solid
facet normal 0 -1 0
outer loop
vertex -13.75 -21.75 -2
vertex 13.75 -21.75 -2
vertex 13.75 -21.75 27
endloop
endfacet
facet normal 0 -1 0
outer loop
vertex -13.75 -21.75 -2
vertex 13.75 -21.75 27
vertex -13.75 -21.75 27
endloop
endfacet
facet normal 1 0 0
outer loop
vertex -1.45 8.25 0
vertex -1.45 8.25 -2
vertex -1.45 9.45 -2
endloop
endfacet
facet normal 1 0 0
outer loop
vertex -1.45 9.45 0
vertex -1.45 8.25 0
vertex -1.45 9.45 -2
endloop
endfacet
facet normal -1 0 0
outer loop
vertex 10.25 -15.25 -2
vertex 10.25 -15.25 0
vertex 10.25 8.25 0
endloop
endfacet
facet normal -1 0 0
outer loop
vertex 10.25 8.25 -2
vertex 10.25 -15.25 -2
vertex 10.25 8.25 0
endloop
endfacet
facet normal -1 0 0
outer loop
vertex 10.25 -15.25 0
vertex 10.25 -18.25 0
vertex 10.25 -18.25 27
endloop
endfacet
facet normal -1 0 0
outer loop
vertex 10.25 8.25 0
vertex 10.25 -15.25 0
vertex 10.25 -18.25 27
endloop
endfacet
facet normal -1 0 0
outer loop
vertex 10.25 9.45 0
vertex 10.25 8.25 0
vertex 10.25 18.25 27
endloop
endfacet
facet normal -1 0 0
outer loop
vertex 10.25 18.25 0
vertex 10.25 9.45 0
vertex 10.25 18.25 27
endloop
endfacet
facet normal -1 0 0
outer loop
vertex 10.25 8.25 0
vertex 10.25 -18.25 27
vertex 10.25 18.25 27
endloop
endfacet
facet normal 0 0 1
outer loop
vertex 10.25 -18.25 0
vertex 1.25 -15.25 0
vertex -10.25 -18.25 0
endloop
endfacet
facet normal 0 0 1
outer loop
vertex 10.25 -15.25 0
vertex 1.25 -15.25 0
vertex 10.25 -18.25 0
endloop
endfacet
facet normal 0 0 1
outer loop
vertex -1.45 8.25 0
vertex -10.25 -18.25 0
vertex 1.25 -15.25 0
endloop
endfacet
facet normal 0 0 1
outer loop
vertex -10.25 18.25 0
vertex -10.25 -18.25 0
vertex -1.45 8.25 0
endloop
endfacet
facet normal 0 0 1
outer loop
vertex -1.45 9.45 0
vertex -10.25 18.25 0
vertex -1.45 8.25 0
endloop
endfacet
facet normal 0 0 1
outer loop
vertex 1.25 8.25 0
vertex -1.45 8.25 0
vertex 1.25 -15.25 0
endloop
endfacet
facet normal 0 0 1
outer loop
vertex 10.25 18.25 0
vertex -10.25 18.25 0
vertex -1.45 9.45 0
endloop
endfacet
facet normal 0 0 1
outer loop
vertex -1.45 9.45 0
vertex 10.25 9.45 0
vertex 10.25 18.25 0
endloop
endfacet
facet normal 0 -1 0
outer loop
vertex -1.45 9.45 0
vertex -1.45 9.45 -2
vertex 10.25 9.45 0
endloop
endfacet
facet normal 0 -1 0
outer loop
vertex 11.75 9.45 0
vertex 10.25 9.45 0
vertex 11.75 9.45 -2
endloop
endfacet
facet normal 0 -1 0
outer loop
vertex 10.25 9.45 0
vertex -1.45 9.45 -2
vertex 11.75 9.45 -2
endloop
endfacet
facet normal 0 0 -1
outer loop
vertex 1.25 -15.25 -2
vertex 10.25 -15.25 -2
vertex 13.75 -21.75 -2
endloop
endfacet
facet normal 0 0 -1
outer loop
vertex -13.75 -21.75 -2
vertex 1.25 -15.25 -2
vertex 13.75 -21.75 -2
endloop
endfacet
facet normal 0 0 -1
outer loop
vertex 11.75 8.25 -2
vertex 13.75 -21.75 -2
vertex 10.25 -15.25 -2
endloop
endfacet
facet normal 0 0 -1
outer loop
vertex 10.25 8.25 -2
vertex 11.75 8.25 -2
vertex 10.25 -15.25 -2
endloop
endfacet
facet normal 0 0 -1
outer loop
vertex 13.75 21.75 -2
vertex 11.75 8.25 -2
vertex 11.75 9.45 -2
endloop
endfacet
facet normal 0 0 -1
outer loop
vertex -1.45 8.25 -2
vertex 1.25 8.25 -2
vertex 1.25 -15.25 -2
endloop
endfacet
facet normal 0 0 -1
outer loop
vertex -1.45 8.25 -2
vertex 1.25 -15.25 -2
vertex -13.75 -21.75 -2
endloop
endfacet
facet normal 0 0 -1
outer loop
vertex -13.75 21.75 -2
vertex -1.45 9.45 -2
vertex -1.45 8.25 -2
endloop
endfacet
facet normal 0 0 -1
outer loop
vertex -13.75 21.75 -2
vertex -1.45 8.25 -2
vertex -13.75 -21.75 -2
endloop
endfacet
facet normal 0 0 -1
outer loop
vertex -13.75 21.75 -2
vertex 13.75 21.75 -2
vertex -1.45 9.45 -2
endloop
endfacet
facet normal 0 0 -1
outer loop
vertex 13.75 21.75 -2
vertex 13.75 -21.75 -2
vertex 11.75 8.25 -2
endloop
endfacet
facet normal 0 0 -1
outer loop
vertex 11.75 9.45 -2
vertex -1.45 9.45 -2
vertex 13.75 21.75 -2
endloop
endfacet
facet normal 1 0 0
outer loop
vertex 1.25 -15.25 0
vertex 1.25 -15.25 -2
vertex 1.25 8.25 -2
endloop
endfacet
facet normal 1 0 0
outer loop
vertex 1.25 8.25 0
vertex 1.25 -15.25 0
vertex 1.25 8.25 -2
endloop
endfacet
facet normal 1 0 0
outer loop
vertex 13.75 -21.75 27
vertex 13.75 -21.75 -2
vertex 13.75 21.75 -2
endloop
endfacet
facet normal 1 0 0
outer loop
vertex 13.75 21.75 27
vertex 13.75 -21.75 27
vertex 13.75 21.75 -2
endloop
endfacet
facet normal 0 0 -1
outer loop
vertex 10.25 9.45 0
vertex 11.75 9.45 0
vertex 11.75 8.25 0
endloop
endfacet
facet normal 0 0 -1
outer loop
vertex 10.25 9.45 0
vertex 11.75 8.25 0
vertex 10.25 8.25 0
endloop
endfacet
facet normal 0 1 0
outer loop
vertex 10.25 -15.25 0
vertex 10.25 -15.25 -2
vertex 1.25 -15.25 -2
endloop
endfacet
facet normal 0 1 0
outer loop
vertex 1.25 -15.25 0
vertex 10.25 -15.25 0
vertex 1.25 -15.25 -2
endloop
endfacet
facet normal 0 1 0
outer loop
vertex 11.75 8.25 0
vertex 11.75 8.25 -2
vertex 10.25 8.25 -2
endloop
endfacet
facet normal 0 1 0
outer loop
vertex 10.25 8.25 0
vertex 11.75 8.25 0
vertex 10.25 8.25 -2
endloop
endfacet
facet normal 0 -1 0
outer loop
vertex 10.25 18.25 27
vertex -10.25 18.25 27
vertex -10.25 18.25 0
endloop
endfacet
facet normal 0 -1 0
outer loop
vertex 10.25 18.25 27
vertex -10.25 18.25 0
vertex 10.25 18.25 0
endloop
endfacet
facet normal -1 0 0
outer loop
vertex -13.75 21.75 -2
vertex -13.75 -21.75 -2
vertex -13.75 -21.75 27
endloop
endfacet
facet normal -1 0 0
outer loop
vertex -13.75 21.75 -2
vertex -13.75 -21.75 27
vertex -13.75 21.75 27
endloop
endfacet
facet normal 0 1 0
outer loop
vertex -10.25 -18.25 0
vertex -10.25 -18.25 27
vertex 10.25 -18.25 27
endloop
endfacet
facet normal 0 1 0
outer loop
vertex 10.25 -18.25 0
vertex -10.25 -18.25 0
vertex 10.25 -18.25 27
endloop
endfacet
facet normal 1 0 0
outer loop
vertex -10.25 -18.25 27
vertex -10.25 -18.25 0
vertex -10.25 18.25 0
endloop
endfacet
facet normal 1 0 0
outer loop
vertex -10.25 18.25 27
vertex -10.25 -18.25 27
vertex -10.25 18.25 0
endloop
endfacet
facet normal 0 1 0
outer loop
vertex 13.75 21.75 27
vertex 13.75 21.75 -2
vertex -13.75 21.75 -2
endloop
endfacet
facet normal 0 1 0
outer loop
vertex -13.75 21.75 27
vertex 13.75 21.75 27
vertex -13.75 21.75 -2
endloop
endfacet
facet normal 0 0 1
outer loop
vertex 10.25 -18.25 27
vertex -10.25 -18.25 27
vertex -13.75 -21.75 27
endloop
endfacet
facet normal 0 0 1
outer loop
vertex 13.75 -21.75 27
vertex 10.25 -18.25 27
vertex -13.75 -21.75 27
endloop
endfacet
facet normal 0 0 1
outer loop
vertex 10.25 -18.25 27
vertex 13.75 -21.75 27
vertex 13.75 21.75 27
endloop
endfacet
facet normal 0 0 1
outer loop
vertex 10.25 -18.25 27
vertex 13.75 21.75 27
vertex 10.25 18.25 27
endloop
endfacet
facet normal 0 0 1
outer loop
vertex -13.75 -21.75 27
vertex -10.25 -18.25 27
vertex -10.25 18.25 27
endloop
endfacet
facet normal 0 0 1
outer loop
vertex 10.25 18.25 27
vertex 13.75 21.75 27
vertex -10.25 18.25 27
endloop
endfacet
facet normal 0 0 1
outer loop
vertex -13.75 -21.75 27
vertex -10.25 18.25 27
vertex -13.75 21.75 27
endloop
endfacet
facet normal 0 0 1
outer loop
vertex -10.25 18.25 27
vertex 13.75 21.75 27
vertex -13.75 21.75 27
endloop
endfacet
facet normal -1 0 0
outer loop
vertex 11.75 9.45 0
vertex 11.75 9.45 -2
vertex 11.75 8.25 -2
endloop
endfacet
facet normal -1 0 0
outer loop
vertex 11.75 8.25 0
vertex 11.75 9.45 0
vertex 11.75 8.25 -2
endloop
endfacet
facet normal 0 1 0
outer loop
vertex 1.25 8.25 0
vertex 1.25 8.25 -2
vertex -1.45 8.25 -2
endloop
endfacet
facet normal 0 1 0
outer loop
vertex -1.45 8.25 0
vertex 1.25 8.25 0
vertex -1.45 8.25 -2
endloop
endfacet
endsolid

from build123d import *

# Parameters (mm, degrees)
SKETCH1_W           = 24.5
SKETCH1_H           = 40.5
SKETCH1_W_2         = 20.5
SKETCH1_H_2         = 36.5
BOSS_EXTRUDE1_DEPTH = 27
SKETCH1_2_W         = 24.5
SKETCH1_2_H         = 40.5
SKETCH1_2_W_2       = 20.5
SKETCH1_2_H_2       = 36.5
BOSS_EXTRUDE2_DEPTH = 2
SKETCH2_W           = 9
SKETCH2_H           = 22
CUT_EXTRUDE1_DEPTH  = 2
CUT_EXTRUDE2_DEPTH  = 2
SKETCH4_W           = 27.5
SKETCH4_H           = 43.5
SKETCH4_W_2         = 24.5
SKETCH4_H_2         = 40.5
BOSS_EXTRUDE3_DEPTH = 29
SKETCH5_W           = 9
SKETCH5_H           = 1.5
CUT_EXTRUDE3_DEPTH  = 2


with BuildPart() as part:
    # Sketch1 → Boss-Extrude1 (new body)
    with BuildSketch(Plane.XY):
        Rectangle(SKETCH1_W, SKETCH1_H)
        Rectangle(SKETCH1_W_2, SKETCH1_H_2, mode=Mode.SUBTRACT)
    extrude(amount=BOSS_EXTRUDE1_DEPTH)

    # Sketch1<2> → Boss-Extrude2 (add)
    # profile 1 of 2: a face of its own
    with BuildSketch(Plane.XY):
        Rectangle(SKETCH1_2_W, SKETCH1_2_H)
        Rectangle(SKETCH1_2_W_2, SKETCH1_2_H_2, mode=Mode.SUBTRACT)
    # profile 2 of 2: a face of its own
    with BuildSketch(Plane.XY):
        Rectangle(SKETCH1_2_W_2, SKETCH1_2_H_2)
    extrude(amount=-BOSS_EXTRUDE2_DEPTH)

    # Sketch2 → Cut-Extrude1 (cut)
    with BuildSketch(Plane(origin=(0, 0, -2), x_dir=(-1, 0, 0), z_dir=(0, 0, -1))):
        with Locations((-5.75, -4.25)):
            Rectangle(SKETCH2_W, SKETCH2_H)
    extrude(amount=-CUT_EXTRUDE1_DEPTH, mode=Mode.SUBTRACT)

    # Sketch3 → Cut-Extrude2 (cut)
    with BuildSketch(Plane(origin=(0, 0, -2), x_dir=(-1, 0, 0), z_dir=(0, 0, -1))):
        Polygon((-11.75, 9.45), (-11.75, 8.25), (0.25, 8.25), (1.45, 8.25), (1.45, 9.45), align=None)
    extrude(amount=-CUT_EXTRUDE2_DEPTH, mode=Mode.SUBTRACT)

    # Sketch4 → Boss-Extrude3 (add)
    with BuildSketch(Plane(origin=(0, 0, -2), x_dir=(-1, 0, 0), z_dir=(0, 0, -1))):
        Rectangle(SKETCH4_W, SKETCH4_H)
        Rectangle(SKETCH4_W_2, SKETCH4_H_2, mode=Mode.SUBTRACT)
    extrude(amount=-BOSS_EXTRUDE3_DEPTH)

    # Sketch5 → Cut-Extrude3 (cut)
    with BuildSketch(Plane.XY):
        with Locations((5.75, 7.5)):
            Rectangle(SKETCH5_W, SKETCH5_H)
    extrude(amount=-CUT_EXTRUDE3_DEPTH, mode=Mode.SUBTRACT)


solid = part.part
